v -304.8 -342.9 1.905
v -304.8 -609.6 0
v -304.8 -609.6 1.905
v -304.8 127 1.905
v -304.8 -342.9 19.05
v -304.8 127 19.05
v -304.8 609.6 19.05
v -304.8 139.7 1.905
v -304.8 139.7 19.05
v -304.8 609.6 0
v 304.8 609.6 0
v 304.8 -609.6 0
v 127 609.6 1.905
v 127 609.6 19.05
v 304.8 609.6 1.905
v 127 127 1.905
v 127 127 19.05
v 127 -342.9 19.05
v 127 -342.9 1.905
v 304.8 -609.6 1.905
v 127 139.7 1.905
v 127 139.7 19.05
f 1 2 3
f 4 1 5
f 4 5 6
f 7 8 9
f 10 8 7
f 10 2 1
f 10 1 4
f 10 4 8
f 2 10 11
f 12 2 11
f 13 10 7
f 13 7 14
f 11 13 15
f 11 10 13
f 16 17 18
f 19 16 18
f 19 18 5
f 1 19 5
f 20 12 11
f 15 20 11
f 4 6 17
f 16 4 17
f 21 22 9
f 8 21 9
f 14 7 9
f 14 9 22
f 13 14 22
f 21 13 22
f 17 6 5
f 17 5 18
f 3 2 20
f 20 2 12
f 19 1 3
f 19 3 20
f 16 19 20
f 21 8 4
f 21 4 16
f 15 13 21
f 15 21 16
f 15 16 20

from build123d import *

# Parameters (mm, degrees)
F0_W     = 609.6
F0_H     = 1219.2
F1_DEPTH = 19.05
F3_DEPTH = 17.145


with BuildPart() as f1:
    # F0 (on Top) → F1 (new body)
    with BuildSketch(Plane.XY):
        Rectangle(F0_W, F0_H)
    extrude(amount=F1_DEPTH)

    # F2 (on face) → F3 (cut)
    with BuildSketch(Plane.XY.offset(19.05)):
        Polygon((304.8, 609.6), (127, 609.6), (127, 139.7), (-304.8, 139.7), (-304.8, 127), (127, 127), (127, -342.9), (-304.8, -342.9), (-304.8, -609.6), (304.8, -609.6), align=None)
    extrude(amount=-F3_DEPTH, mode=Mode.SUBTRACT)


solid = f1.part
